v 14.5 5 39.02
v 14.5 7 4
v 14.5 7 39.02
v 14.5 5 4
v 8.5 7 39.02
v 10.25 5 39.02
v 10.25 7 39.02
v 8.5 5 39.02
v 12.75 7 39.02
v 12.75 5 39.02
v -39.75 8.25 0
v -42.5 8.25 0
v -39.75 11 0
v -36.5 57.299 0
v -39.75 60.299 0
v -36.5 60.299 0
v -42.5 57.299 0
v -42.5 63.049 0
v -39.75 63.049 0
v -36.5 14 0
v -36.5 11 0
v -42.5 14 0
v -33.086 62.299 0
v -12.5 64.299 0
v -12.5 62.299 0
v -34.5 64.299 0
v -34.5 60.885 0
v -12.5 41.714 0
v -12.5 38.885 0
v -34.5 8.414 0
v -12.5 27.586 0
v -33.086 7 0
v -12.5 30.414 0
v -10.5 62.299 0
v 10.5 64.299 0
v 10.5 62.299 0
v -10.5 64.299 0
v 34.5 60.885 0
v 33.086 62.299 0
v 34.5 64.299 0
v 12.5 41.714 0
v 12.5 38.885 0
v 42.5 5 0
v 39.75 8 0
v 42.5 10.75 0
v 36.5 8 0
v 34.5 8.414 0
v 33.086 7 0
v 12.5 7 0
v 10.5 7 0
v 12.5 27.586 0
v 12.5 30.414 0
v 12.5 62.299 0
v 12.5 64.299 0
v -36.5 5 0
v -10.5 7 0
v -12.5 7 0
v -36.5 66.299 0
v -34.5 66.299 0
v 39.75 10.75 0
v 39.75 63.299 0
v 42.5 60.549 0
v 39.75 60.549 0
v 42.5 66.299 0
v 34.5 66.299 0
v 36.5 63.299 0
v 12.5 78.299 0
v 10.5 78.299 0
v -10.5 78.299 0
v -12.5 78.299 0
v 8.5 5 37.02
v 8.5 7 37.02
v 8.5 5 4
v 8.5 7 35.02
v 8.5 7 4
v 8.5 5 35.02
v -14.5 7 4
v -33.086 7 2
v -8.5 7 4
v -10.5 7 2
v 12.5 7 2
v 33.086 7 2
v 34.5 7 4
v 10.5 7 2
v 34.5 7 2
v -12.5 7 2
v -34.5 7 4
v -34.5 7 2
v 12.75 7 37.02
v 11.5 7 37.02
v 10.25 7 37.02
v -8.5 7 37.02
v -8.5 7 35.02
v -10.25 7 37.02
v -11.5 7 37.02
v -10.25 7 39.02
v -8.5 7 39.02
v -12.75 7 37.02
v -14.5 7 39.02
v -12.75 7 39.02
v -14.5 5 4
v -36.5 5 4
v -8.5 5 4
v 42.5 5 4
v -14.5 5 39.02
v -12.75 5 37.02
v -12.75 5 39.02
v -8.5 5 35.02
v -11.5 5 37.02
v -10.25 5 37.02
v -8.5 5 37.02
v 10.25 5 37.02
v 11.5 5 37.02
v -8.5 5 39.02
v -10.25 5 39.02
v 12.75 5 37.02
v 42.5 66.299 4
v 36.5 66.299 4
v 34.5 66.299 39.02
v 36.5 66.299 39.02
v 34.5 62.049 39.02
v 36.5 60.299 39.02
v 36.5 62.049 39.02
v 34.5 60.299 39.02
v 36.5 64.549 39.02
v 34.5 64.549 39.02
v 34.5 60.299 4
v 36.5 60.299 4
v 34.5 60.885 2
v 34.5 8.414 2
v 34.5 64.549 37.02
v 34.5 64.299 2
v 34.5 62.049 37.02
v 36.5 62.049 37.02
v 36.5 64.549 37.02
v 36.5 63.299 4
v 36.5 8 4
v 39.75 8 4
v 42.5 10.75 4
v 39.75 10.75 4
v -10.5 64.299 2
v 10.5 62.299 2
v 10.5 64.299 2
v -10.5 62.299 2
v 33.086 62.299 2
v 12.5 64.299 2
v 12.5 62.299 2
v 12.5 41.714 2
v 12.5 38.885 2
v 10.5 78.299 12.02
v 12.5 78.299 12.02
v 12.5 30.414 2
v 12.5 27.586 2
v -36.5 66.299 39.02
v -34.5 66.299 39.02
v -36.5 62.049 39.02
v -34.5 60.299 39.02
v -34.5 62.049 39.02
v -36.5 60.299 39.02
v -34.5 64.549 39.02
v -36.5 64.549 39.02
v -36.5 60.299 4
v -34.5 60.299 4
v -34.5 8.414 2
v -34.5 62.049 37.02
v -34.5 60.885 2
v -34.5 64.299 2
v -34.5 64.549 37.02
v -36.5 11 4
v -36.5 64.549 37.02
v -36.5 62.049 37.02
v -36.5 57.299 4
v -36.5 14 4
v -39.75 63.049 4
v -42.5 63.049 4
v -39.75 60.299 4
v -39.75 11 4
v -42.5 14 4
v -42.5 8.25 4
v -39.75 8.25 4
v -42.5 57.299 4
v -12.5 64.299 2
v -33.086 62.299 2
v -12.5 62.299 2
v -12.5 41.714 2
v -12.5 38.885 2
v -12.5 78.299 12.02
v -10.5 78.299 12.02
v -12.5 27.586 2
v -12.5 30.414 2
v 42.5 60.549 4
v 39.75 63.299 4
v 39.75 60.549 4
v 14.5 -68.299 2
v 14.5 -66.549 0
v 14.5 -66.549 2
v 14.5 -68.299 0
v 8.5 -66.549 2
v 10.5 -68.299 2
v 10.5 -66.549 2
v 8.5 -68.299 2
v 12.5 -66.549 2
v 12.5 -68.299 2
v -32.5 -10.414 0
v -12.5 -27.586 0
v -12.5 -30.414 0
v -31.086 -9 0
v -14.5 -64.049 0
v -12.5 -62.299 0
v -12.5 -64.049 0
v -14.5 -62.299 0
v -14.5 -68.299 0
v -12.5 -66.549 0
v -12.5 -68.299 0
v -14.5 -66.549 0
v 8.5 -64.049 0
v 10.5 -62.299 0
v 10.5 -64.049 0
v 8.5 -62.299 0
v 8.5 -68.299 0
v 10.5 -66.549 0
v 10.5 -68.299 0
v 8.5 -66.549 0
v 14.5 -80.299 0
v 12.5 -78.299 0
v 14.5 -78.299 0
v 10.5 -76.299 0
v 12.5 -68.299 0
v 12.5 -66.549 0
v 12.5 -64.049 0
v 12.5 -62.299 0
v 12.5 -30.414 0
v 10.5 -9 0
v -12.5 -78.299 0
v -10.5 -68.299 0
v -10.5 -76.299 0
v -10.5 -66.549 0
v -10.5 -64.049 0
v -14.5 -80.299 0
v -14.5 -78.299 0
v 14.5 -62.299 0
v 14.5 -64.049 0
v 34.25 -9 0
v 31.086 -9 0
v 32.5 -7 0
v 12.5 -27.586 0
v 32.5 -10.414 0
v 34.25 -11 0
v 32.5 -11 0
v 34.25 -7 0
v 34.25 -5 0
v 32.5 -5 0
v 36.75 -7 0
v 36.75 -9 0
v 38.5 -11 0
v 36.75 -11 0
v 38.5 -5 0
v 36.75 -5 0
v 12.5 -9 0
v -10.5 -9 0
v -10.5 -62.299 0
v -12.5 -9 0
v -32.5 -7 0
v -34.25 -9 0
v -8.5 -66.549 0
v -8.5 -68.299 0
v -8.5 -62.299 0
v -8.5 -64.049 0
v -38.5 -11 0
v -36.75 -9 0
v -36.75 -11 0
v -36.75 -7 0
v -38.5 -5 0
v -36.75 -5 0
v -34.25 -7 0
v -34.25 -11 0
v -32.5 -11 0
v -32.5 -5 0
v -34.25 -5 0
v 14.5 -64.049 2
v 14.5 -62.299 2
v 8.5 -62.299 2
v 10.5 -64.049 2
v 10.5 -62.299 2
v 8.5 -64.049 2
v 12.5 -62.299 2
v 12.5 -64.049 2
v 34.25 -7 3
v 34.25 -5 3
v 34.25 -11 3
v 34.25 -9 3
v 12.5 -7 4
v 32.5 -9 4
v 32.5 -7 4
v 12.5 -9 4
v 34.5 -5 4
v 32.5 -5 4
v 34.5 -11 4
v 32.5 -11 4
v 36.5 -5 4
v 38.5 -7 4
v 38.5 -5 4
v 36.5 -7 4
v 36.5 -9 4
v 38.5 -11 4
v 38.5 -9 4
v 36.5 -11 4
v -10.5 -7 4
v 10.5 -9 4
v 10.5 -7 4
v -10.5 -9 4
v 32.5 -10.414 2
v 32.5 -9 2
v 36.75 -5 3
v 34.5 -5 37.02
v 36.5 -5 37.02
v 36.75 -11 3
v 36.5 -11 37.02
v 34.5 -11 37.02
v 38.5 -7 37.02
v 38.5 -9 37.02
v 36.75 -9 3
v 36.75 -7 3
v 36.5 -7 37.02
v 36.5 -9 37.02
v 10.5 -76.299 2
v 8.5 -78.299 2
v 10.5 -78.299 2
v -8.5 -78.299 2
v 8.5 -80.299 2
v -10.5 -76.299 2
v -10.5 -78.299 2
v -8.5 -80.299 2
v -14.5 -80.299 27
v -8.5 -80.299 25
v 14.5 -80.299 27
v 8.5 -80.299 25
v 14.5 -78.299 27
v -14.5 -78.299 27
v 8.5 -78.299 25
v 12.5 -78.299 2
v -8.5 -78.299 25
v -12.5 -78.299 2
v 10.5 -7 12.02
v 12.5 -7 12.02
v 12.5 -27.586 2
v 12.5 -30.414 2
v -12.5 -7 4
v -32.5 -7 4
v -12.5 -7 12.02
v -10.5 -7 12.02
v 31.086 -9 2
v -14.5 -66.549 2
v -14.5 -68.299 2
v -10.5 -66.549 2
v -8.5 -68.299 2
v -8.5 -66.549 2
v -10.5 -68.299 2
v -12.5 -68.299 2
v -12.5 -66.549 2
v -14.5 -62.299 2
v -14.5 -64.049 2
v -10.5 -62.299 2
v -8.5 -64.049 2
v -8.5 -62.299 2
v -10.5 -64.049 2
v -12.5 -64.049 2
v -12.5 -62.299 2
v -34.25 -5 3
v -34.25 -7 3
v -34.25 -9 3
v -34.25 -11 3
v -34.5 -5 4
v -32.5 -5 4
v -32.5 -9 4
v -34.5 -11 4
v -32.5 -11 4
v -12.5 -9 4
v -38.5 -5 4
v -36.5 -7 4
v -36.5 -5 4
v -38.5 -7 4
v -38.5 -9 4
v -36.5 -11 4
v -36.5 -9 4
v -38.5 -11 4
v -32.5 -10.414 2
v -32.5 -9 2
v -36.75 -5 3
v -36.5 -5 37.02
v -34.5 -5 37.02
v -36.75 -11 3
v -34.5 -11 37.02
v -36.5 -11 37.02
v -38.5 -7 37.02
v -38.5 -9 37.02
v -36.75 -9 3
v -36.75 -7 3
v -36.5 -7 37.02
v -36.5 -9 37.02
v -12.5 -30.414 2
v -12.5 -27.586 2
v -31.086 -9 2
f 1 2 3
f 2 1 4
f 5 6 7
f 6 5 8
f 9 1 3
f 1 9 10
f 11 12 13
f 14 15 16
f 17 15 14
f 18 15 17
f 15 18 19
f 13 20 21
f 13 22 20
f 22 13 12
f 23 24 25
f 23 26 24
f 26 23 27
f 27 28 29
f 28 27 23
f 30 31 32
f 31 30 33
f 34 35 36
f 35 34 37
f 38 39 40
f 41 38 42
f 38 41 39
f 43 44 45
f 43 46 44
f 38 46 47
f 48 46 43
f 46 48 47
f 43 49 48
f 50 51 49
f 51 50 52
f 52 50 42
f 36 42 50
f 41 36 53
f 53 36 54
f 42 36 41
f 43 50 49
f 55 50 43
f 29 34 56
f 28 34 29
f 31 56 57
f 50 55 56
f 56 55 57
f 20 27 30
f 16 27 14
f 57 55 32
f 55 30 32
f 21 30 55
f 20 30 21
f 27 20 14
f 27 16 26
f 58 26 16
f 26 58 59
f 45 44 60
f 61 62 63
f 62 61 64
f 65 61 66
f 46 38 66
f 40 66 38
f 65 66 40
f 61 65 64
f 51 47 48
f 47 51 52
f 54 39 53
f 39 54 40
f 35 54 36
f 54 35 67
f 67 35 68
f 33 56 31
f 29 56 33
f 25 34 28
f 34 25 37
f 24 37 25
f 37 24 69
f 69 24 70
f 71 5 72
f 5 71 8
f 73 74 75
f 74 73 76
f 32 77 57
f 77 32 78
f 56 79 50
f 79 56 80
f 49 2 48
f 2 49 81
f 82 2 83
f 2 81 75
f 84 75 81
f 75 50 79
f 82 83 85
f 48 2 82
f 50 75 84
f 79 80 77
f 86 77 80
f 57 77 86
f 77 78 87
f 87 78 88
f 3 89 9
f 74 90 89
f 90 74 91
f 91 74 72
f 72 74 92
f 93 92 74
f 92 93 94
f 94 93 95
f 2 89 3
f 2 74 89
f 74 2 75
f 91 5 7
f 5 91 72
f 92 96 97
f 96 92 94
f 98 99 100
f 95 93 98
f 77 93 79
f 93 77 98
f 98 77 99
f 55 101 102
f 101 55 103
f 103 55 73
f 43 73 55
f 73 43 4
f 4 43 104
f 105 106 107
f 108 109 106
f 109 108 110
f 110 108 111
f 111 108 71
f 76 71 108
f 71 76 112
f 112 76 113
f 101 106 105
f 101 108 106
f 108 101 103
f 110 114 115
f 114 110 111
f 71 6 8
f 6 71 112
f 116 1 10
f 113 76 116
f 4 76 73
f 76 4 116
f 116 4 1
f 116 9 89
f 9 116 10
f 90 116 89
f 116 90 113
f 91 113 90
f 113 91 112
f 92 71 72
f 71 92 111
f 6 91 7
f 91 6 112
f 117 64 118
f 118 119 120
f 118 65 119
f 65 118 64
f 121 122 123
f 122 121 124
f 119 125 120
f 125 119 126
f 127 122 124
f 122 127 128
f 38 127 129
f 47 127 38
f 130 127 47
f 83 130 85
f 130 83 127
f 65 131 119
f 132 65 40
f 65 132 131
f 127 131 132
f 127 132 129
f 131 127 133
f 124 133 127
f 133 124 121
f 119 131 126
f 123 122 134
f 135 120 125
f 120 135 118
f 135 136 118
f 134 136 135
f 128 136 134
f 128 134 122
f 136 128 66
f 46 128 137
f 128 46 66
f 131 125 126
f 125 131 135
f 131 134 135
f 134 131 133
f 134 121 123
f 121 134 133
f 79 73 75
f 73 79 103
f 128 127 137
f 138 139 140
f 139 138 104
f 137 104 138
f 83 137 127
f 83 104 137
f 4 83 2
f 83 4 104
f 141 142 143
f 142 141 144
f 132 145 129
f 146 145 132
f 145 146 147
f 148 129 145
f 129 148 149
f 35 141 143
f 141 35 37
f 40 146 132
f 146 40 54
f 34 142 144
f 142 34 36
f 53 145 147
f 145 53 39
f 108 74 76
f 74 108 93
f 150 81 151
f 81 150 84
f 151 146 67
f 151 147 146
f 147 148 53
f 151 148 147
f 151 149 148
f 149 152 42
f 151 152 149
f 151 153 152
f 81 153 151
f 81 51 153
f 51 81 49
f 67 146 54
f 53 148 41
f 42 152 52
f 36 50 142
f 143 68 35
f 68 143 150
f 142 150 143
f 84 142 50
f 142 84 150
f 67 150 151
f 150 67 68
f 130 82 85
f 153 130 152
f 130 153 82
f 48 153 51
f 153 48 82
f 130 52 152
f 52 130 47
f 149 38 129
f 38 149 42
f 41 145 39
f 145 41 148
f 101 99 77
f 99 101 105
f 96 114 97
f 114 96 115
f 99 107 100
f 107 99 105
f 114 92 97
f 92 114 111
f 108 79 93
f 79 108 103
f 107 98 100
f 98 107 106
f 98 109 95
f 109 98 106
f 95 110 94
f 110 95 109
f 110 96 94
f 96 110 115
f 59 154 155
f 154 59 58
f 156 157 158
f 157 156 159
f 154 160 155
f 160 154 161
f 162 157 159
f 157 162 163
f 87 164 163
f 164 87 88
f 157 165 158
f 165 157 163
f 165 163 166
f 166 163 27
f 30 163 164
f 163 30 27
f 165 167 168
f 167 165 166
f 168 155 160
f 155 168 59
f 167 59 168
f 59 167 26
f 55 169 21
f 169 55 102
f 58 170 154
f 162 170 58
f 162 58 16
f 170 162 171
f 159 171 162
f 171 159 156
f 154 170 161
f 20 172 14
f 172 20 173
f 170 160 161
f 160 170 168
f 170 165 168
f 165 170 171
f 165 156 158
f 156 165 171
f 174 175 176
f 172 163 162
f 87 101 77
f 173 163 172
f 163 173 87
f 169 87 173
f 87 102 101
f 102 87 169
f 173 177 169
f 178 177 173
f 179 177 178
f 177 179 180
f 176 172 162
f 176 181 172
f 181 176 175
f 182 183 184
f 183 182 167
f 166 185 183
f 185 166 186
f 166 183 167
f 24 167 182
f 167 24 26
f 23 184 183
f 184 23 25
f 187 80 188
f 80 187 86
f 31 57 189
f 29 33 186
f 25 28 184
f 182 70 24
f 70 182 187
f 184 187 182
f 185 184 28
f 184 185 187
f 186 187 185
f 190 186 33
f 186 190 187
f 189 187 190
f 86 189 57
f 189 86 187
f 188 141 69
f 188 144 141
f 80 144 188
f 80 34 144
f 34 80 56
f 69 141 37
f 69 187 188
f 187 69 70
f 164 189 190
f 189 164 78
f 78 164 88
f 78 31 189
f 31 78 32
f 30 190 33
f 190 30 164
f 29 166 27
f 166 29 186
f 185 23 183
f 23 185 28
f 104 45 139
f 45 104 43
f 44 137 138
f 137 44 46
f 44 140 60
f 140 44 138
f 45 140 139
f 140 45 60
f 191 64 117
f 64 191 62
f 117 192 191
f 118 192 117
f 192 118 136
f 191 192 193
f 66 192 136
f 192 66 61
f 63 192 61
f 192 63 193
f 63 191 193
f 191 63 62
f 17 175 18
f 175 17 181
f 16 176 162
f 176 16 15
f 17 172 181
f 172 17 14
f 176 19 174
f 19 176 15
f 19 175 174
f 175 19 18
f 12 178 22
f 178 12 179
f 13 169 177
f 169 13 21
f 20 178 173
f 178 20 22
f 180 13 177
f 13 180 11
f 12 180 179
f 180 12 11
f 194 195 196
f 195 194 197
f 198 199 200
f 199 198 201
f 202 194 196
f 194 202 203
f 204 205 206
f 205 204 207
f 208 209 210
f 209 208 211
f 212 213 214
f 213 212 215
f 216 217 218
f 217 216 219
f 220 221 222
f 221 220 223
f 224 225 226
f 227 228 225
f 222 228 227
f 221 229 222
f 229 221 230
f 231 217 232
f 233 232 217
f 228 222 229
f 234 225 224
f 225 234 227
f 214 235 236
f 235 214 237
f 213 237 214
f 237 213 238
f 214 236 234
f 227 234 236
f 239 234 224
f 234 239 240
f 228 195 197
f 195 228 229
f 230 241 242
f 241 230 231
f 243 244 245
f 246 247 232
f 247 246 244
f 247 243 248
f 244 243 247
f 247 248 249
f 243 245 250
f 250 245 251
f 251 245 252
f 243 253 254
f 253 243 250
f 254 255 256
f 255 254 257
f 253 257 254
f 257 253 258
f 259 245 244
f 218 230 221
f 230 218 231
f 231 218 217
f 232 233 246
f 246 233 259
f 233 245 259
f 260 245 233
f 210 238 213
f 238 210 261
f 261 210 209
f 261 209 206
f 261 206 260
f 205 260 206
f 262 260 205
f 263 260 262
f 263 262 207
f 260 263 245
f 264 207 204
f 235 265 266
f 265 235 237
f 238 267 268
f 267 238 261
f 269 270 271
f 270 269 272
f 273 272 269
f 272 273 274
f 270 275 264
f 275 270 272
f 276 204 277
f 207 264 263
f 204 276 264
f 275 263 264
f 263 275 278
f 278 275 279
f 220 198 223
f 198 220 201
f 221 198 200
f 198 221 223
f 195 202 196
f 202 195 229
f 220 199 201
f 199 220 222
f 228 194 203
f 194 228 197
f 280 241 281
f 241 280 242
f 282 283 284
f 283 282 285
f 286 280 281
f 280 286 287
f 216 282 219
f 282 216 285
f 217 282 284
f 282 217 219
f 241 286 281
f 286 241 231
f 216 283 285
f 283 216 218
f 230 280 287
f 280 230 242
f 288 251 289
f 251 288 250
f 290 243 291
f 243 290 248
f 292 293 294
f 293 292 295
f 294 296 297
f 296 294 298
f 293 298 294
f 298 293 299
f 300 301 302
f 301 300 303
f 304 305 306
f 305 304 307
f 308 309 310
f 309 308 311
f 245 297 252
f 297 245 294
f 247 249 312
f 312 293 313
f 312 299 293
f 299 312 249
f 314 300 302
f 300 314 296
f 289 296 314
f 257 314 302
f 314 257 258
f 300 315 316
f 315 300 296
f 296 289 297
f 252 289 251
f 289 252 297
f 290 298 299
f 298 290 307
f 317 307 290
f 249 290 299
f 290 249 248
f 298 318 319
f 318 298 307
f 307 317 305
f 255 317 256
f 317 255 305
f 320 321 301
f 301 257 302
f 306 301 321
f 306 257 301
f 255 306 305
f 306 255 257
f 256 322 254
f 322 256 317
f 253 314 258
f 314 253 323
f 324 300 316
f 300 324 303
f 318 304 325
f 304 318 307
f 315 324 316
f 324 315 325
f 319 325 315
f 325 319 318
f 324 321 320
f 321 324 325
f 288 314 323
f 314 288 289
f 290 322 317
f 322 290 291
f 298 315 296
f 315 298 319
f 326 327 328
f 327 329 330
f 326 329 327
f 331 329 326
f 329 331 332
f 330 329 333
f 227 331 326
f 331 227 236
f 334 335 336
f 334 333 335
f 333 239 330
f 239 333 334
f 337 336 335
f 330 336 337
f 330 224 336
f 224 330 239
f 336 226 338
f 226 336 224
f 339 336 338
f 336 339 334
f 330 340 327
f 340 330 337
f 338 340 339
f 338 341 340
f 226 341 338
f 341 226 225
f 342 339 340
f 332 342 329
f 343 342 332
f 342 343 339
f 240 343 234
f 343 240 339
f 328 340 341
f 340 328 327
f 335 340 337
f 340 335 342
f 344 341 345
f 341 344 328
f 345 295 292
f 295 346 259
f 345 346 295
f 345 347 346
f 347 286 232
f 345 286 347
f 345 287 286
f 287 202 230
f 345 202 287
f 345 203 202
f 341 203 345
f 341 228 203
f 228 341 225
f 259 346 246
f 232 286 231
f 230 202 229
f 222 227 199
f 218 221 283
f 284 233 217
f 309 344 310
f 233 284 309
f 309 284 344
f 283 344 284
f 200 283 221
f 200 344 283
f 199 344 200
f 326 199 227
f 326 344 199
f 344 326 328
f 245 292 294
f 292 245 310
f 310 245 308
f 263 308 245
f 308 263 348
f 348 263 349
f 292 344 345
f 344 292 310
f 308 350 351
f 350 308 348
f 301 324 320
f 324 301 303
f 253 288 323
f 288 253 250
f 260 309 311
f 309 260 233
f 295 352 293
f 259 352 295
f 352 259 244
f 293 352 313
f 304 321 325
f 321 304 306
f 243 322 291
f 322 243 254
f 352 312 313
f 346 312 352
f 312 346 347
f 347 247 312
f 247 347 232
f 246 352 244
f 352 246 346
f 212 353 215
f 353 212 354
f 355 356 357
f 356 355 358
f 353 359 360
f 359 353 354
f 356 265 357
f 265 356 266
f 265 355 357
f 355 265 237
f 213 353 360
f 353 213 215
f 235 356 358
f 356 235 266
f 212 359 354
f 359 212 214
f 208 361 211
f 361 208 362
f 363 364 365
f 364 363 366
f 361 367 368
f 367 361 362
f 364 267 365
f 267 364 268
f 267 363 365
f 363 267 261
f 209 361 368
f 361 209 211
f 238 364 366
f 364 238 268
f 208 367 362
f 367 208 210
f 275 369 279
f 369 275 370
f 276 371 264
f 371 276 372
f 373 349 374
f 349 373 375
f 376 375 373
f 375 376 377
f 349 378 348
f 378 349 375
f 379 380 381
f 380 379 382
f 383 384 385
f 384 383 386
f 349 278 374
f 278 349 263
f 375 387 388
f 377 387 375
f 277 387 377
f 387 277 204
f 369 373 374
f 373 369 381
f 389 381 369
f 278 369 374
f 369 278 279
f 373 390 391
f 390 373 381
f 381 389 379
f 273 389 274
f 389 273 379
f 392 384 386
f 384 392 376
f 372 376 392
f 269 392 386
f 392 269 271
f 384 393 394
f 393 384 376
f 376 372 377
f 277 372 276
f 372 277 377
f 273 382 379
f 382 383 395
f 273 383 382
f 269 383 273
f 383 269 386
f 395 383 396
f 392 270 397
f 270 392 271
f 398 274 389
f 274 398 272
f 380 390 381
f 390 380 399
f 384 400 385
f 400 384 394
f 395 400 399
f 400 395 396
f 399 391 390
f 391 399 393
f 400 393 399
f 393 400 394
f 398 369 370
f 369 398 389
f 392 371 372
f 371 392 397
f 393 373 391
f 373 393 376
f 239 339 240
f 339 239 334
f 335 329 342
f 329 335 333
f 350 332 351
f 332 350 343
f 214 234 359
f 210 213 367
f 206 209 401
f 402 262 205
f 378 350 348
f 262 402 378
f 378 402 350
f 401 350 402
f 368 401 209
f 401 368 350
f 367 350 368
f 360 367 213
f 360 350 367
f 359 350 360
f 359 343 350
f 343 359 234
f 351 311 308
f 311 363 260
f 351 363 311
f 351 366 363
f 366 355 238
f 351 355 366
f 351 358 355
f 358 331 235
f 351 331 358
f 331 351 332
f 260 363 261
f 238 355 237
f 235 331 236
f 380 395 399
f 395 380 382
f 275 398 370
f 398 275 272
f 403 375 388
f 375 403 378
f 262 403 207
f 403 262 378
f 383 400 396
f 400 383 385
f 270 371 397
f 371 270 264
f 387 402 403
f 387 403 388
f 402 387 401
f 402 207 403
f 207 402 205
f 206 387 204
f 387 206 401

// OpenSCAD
/* [Main] */

// What would you like to generate?
part = "both"; // [base:Base Only,top:Top Only,both:Base and Top]

// Number of holders
holder_count = 1;

// Width of cards to be used (mm)
card_width = 64;

// Length of cards to be used (mm)
card_length = 88;

// Height of holder (approx height of deck) (mm)
holder_height = 25;	// Height of holder

/* [Tweaking] */

// How far back the top layer should be (mm)
top_offset = 14;
// How much the cards overhang the ends of the holder (mm)
overhang = 16;
// The angle of the angled supports
angle = 8;
// Gap added to card with to give width of holder
card_gap = 5;
// Thickness of support bars
bar_thickness = 2;
// Gap to allow top/bottom to clip together
support_gap = 0.25;
// Gap to allow clips to clip together
clip_card_gap = 0.25;
// Distance between top and bottom if printing both
both_gap = 10;


/****************************************
 *
 ****************************************/

holder_width = card_width + card_gap;
angled_length = cos(angle) * (card_length - overhang);;
angled_height = (tan(angle) * angled_length) + bar_thickness;
base_length = angled_length - top_offset;
base_full_length = angled_length + bar_thickness;
top_full_length = angled_length + (bar_thickness * 2);
clip_thickness = bar_thickness * 1.5;
// Offset of angled Support (1/6th from 1/2 = 1/3rd!)
offset = (holder_width) / 6;
// Offset for diagonal bars
diag_offset = sin(45) * bar_thickness;

print_part();

module print_part()
{
	if (part == "base")
	{
		bases();
	} else if (part == "top") {
		tops();
	} else if (part == "both") {
		// translate stuff here...
		translate([0, (base_full_length + both_gap) / 2, 0])
			bases();
		translate([0, -(top_full_length + both_gap) / 2, 0])
			tops();
	}
}

module tops()
{
	full_width = (holder_width + bar_thickness) * (holder_count) + (bar_thickness * 3);
	translate([full_width/2, -top_full_length/2, 0])
	{
		// Draw each base
		for(i=[1:holder_count])
		{
			translate([-(holder_width + bar_thickness) * (i-1),0,0])
				singleTop();
		}
		// Thicker bars at ends
		translate([-bar_thickness, angled_length, 0])
		{
			cube([bar_thickness, bar_thickness, holder_height + angled_height]);
		}
		translate([-full_width, angled_length, 0])
		{
			cube([bar_thickness, bar_thickness, holder_height + angled_height]);
		}
	}
}

module singleTop()
{
	// Length of diagonal bar
	diag_length =
		(
			(offset*2 - bar_thickness)	// Distance between middle of angled support
												// 	and inside edge of side bar
			+ (diag_offset/2) 				// Distance from inside edge of side bar
												//		to rotation axis of diagional bar
			+ (bar_thickness-diag_offset)	// Distance from rotation axis
												//		to centre of diagonal bar
		) / sin(45);

	translate([-holder_width/2-(bar_thickness*2),0,0])
	{
		// As the base is mirrored down the middle, do a side at a time
		for (m=[[0,0,0],[1,0,0]])
		{
			mirror(m)
			{
				// Bar at back
				cube([offset, bar_thickness * 2, bar_thickness]);

				// Support at back
				translate([offset-(bar_thickness * 1.5),0,0])
					cube([bar_thickness * 3, bar_thickness, holder_height + bar_thickness]);
				translate([0,0,holder_height])
					cube([offset, bar_thickness, bar_thickness]);

				// Angled Support
				translate([offset-(bar_thickness * 0.5),bar_thickness,0])
					angledSupport();

				// Notches
				translate([offset-(bar_thickness * 1.5), 0, 0])
				{
					for(s=[
								[0, top_offset - bar_thickness, 0],
								[0, top_offset + bar_thickness + support_gap, 0]
							])
					{
						translate(s)
							cube([bar_thickness * 3, bar_thickness - support_gap, bar_thickness]);
					}
				}

				// Bar at front
				translate([0, angled_length, 0])
					cube([holder_width/2 + (bar_thickness * 2), bar_thickness, bar_thickness * 2]);

				// Front support
				translate([holder_width/2 - bar_thickness, angled_length - bar_thickness, 0])
				{
					for(t=[
							[0, 0, 0],
							[bar_thickness*2 + support_gap, 0, 0]
						])
					{
						translate(t)
							cube([bar_thickness - support_gap, bar_thickness * 3, bar_thickness * 2]);
					}

					translate([bar_thickness,0,bar_thickness * 1.5])
					{
						cube([bar_thickness,
								bar_thickness * 3,
								holder_height + angled_height - (bar_thickness * 1.5)]);
					}

					translate([0, 0, bar_thickness * 1.5])
						cube([bar_thickness * 3, bar_thickness * 3, bar_thickness * 0.5]);
				}

				// Diagonal supports
				translate([holder_width/2, angled_length + bar_thickness - diag_offset, 0])
					rotate([0,0,135])
						cube([bar_thickness,diag_length,bar_thickness]);
			}
		}
	}
}


module bases()
{
	// Move bases so generated object is in middle of area
	translate([
			((holder_width * holder_count) + (bar_thickness * (holder_count + 1)))/2,
			-base_full_length/2,
			0])
	{
		// Draw each base
		for(i=[1:holder_count])
		{
			translate([-(holder_width + bar_thickness) * (i-1),0,0])
				singleBase();
		}

		// Add the clips - all mirrored/rotated in their own way

		clip();

		translate([0,base_length + (bar_thickness * 2),0])
			mirror([0,1,0])
				clip();

		translate([-(holder_width + bar_thickness) * (holder_count) - bar_thickness,
						base_length + (bar_thickness * 2) - (clip_thickness * 3),
						0])
			mirror([1,0,0])
				clip();

		translate([-(holder_width + bar_thickness) * (holder_count) - bar_thickness,
						(clip_thickness * 3),
						0])
			rotate([0,0,180])
				clip();

	}
}


module singleBase()
{
	// Length of diagonal bar
	diag_length =
		(
			(offset*2) 						// Distance between middle of angled support
												// 	and inside edge of side bar
			+ (diag_offset/2) 				// Distance from inside edge of side bar
												//		to rotation axis of diagional bar
			+ (bar_thickness-diag_offset)	// Distance from rotation axis
												//		to centre of diagonal bar
		) / sin(45);

	translate([-holder_width/2-bar_thickness,0,0])
	{
		// As the base is mirrored down the middle, do a side at a time
		for (m=[[0,0,0],[1,0,0]])
		{
			mirror(m)
			{
				// Bar at back
				cube([holder_width/2, bar_thickness, bar_thickness * 2]);
				// Bar at front
				translate([0,base_length,0])
					cube([holder_width/2, bar_thickness, bar_thickness]);
				// Bar at top of back support
				translate([0,0,holder_height + angled_height - bar_thickness])
					cube([offset, bar_thickness, bar_thickness]);

				// Side bar
				translate([holder_width/2,0,0])
					cube([bar_thickness, base_length + bar_thickness, bar_thickness * 2]);

				// angled Support
				translate([offset-(bar_thickness * 0.5),bar_thickness,0])
					angledSupport();

				// Back support
				translate([offset-(bar_thickness * 1.5),0,0])
					verticalSupport();
				// Front support
				translate([holder_width/2 + bar_thickness,base_length - bar_thickness,0])
					rotate([0,0,90])
						verticalSupport();

				// Diagonal at back
				translate([holder_width/2 + (bar_thickness - diag_offset), 0, 0])
					rotate([0,0,45])
						cube([bar_thickness,diag_length,bar_thickness]);
				// Diagonal at front
				translate([holder_width/2 + bar_thickness, base_length + bar_thickness - diag_offset, 0])
					rotate([0,0,135])
						cube([bar_thickness,diag_length,bar_thickness]);
			}
		}
	}
}


module angledSupport()
{
/*
	// Calculate the maximum height of holes
	max_hole = floor(
		((angled_length - (bar_thickness * 2)) * tan(angle))
		- bar_thickness);

	difference()
	{
*/
		// The triangle, with a bar of bar_thickness underneath
		polyhedron(points=[
			[0,0,0], [bar_thickness,0,0],
			[0,angled_length,0], [bar_thickness,angled_length,0],
			[0,angled_length,angled_height], [bar_thickness,angled_length,angled_height],
			[0,0,bar_thickness], [bar_thickness,0,bar_thickness] ],
			faces=[
				[0,1,2], [1,3,2],
				[2,3,5], [2,5,4],
				[4,5,6], [5,7,6],
				[0,6,1], [6,7,1],
				[0,2,6], [2,4,6],
				[3,1,7], [5,3,7]
		]);
/*
		// Step through heights of holes and add them
		if(max_hole>0)
		{
			for (v=[bar_thickness+1:bar_thickness+max_hole])
			{
				translate([-0.1, v/tan(angle), bar_thickness])
					cube([bar_thickness + 0.2,
							min((v+1)/tan(angle), angled_length)
								-(v/tan(angle))
								-bar_thickness,
							(v-bar_thickness)]);
			}
		}
	}
*/
}

module verticalSupport()
{
	difference() {
		cube([bar_thickness*3,bar_thickness,holder_height + angled_height + bar_thickness]);
		translate([bar_thickness-support_gap,0,holder_height + angled_height]) {
			cube([bar_thickness+(support_gap * 2),bar_thickness,bar_thickness * 1.1]);
		}
	}
}


module clip()
{
	translate([-bar_thickness,0,0])
		cube([clip_thickness * 2 + bar_thickness, clip_thickness, bar_thickness * 2]);
	translate([clip_thickness + clip_card_gap, clip_thickness, 0])
		cube([clip_thickness - clip_card_gap, clip_thickness - clip_card_gap, bar_thickness * 2]);
}
